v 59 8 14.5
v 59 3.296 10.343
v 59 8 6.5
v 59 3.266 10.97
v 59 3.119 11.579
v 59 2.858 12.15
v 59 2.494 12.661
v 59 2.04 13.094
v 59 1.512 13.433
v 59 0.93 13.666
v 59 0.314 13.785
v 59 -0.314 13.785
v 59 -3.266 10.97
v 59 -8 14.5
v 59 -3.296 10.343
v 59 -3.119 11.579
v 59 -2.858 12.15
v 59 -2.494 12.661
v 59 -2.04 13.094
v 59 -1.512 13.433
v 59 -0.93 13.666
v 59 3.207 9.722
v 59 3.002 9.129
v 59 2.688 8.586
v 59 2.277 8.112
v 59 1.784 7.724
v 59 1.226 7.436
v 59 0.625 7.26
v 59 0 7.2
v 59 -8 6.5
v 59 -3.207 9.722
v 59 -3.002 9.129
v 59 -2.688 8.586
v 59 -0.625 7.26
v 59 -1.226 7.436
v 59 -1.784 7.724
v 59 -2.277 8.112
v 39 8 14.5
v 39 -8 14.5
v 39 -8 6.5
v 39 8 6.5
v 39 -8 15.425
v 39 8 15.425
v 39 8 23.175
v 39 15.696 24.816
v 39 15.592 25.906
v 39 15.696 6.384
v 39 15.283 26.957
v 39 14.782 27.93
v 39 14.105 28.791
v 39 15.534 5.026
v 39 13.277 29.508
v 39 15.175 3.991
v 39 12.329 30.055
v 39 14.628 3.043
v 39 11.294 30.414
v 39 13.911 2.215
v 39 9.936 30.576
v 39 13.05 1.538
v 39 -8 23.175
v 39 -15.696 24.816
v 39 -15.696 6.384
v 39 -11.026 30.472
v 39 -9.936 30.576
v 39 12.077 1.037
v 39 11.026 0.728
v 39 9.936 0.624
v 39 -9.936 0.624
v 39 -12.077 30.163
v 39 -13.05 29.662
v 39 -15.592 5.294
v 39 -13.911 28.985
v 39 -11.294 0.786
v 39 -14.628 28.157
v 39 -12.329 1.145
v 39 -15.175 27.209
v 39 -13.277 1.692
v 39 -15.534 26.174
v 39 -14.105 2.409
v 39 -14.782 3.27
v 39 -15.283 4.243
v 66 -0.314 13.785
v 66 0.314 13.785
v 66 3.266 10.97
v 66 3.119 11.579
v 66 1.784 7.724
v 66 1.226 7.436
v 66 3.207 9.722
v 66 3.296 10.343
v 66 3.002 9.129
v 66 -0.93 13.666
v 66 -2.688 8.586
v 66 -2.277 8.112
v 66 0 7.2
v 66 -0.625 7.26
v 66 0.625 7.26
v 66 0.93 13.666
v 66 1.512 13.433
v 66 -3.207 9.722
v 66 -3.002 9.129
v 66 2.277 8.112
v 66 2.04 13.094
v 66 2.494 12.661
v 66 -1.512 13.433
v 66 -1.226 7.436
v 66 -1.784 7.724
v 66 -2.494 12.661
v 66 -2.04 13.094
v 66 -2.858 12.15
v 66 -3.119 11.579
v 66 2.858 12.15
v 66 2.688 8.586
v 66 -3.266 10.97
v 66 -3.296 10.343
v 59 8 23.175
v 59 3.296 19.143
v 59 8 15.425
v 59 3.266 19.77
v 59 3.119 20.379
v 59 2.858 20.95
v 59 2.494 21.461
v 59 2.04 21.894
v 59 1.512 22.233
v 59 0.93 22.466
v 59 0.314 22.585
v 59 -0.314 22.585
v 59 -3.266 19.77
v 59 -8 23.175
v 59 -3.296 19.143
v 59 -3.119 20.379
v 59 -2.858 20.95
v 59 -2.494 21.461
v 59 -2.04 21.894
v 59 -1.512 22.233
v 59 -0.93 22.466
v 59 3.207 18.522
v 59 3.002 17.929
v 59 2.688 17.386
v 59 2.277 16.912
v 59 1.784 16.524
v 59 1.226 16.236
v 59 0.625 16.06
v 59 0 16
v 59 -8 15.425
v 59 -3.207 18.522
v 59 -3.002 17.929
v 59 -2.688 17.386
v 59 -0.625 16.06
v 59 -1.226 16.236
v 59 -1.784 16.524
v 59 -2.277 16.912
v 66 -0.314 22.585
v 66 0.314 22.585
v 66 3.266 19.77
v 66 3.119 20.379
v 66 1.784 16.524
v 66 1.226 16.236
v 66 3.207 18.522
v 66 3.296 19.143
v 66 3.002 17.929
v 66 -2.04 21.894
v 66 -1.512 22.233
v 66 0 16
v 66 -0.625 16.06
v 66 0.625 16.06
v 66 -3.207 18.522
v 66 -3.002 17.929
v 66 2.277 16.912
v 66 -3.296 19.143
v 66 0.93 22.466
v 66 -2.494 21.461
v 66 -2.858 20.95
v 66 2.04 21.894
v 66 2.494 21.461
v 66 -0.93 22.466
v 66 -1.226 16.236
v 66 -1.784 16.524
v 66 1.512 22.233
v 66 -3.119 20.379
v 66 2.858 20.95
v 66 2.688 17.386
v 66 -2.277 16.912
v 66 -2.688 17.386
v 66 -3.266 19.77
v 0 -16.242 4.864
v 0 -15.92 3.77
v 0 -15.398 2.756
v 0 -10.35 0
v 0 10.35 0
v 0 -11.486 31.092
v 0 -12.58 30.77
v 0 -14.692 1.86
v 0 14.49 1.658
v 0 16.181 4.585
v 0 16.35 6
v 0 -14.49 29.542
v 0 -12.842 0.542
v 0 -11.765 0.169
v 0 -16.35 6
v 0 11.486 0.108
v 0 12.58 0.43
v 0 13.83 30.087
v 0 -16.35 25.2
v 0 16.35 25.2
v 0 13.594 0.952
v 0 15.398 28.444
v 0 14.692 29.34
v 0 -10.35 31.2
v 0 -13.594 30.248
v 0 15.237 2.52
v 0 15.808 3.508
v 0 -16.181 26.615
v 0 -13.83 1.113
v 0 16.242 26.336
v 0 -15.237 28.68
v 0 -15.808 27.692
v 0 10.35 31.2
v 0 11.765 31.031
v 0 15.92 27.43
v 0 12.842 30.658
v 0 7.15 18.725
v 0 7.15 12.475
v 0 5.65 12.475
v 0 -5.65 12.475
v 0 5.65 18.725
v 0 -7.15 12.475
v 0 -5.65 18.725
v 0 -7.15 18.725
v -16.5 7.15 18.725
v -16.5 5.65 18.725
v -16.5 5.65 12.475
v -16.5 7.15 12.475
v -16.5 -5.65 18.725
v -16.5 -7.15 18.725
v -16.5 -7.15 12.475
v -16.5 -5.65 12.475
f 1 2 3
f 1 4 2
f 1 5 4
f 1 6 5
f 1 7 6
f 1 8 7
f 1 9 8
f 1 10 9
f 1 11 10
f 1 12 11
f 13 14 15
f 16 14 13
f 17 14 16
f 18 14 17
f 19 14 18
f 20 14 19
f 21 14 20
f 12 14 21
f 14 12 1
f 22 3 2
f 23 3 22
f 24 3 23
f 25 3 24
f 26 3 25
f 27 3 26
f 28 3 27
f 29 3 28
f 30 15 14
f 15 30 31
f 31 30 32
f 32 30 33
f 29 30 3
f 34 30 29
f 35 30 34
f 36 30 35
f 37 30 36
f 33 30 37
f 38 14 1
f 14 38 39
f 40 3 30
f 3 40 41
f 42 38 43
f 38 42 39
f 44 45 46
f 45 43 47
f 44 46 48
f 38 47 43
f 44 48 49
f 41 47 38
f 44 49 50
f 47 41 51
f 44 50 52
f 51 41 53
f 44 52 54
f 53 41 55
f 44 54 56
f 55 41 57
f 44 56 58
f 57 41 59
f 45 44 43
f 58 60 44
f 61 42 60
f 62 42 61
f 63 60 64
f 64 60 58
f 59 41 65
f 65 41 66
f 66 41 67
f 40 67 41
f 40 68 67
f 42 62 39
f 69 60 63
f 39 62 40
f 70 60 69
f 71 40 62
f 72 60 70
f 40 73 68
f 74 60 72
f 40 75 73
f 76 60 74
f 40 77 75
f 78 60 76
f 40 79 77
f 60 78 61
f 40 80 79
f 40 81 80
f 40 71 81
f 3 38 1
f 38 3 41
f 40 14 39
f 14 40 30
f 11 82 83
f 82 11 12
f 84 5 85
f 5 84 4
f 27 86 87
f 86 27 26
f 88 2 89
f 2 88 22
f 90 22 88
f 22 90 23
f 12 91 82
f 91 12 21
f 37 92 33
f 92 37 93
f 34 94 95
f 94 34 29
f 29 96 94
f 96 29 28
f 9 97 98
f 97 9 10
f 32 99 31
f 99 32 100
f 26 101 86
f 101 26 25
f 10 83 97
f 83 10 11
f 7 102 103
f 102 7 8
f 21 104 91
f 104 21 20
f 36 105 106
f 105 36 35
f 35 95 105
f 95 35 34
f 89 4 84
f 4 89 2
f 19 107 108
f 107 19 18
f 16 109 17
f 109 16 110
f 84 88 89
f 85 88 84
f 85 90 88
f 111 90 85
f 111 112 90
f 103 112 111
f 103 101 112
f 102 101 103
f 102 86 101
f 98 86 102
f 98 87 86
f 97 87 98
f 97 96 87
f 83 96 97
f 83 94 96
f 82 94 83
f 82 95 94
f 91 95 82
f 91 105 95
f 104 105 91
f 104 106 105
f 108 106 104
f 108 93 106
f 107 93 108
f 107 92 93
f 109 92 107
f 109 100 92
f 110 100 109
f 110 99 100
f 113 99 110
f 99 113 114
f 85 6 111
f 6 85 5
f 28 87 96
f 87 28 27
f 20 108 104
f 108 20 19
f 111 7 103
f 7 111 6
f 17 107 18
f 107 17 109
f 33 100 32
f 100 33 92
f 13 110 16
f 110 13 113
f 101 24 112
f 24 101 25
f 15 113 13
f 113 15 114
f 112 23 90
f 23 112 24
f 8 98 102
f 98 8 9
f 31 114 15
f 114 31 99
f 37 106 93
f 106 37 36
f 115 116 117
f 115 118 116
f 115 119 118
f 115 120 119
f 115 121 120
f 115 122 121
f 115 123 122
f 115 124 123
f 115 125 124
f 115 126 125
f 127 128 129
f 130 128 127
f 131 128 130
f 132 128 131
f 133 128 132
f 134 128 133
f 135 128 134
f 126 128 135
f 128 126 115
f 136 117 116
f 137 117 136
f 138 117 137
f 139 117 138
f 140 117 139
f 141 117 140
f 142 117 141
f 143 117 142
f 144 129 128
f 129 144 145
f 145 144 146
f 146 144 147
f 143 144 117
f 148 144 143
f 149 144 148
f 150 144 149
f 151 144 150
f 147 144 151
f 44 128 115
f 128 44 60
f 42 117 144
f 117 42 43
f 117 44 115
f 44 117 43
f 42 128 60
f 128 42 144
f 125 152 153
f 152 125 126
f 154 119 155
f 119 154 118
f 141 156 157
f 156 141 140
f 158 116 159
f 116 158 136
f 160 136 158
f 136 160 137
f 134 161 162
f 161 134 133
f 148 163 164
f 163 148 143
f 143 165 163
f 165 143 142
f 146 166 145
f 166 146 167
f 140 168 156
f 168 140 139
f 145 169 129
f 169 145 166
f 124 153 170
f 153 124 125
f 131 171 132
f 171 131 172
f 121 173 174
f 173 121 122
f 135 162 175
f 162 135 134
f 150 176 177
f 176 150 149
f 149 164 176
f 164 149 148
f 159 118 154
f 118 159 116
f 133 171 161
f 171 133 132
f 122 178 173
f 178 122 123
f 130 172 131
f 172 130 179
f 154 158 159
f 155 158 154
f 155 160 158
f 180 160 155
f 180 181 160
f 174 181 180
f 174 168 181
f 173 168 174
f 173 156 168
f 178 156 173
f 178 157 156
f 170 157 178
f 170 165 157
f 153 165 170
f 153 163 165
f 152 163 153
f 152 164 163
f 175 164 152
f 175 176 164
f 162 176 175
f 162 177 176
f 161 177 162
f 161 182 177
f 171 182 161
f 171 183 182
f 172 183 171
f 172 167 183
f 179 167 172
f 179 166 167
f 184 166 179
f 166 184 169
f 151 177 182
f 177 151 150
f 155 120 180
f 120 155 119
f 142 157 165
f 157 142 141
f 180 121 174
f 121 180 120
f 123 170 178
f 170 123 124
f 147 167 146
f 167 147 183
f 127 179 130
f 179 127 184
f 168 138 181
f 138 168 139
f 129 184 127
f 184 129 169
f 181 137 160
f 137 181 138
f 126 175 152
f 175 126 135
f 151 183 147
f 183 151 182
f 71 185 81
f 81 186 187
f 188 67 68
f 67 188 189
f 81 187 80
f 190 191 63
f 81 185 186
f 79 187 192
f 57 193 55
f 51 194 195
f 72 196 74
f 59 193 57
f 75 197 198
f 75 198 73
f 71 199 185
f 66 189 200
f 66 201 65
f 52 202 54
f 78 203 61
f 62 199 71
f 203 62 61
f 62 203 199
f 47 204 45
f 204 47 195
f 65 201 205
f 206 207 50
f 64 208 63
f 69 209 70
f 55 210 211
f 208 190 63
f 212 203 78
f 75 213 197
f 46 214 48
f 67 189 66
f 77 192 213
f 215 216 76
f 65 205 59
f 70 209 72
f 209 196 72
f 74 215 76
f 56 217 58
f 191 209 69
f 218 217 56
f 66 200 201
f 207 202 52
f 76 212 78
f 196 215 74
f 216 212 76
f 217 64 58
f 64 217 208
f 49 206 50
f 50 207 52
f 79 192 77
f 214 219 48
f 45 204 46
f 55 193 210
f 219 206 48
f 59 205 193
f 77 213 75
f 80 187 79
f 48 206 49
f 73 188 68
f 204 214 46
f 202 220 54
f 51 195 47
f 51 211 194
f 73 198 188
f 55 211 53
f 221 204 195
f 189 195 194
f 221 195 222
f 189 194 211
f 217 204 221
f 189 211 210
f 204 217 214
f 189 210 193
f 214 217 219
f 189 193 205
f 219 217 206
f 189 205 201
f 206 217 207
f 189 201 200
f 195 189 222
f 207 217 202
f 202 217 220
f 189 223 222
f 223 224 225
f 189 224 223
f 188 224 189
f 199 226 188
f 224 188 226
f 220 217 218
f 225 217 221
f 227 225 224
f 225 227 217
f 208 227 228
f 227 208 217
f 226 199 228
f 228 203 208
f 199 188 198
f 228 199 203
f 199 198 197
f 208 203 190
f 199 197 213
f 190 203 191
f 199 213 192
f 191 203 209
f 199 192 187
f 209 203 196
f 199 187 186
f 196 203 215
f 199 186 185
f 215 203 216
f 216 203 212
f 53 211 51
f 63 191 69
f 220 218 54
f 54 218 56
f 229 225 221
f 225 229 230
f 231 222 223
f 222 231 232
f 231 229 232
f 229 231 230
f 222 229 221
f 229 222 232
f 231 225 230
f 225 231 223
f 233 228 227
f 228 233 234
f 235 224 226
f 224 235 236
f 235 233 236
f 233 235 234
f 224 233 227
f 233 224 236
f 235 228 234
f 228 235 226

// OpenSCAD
//======================================================================
// usbPower.scad
//
// USB Wall Charger, iGENJUN 2.4A Phone Charger Dual USB Port Cube 
// Power Plug
//
// DrTomFlint, 19 Oct 2024
//======================================================================

rUsb=6.0;       // radius of corners
xUsb=31.2;
yUsb=32.7;  
zUsb=39;
F2=33;

//----------------------------------------------------------------------
module usbPower(plug=3){

  
  // main boss
  translate([0,0,xUsb/2])
  rotate([0,90,0])
  linear_extrude(height=zUsb,scale=0.96)
  offset(r=rUsb,$fn=F2)
  square([xUsb-2*rUsb,yUsb-2*rUsb],center=true);
  
  // ac plugs
  translate([-16.5/2,12.8/2,xUsb/2])
  cube([16.5,1.5,6.25],center=true);
  translate([-16.5/2,-12.8/2,xUsb/2])
  cube([16.5,1.5,6.25],center=true);

  // lower output 
  if(plug==1){
    hull(){
      translate([zUsb+0,5.25,10.5])
      rotate([0,90,0])
      cylinder(r=7.8/2,h=20,$fn=F2);
      translate([zUsb+0,-5.25,10.5])
      rotate([0,90,0])
      cylinder(r=7.8/2,h=20,$fn=F2);
    }
    
    translate([zUsb+20,0,10.5])
    rotate([0,90,0])
    cylinder(r=3.3,h=7,$fn=F2);
  }

  // upper output 
  if(plug==2){
    translate([zUsb+10,0,10.5+8.8])
    cube([20,16,7.75],center=true);
    translate([zUsb+20,0,10.5+8.8])
    rotate([0,90,0])
    cylinder(r=3.3,h=7,$fn=F2);
  }
  
  // both outputs
  if(plug==3){
    translate([zUsb+10,0,10.5])
    cube([20,16,8],center=true);
    translate([zUsb+20,0,10.5])
    rotate([0,90,0])
    cylinder(r=3.3,h=7,$fn=F2);
      
    translate([zUsb+10,0,10.5+8.8])
    cube([20,16,7.75],center=true);
    translate([zUsb+20,0,10.5+8.8])
    rotate([0,90,0])
    cylinder(r=3.3,h=7,$fn=F2);
  }
  
}
  

//======================================================================

usbPower();

//======================================================================
